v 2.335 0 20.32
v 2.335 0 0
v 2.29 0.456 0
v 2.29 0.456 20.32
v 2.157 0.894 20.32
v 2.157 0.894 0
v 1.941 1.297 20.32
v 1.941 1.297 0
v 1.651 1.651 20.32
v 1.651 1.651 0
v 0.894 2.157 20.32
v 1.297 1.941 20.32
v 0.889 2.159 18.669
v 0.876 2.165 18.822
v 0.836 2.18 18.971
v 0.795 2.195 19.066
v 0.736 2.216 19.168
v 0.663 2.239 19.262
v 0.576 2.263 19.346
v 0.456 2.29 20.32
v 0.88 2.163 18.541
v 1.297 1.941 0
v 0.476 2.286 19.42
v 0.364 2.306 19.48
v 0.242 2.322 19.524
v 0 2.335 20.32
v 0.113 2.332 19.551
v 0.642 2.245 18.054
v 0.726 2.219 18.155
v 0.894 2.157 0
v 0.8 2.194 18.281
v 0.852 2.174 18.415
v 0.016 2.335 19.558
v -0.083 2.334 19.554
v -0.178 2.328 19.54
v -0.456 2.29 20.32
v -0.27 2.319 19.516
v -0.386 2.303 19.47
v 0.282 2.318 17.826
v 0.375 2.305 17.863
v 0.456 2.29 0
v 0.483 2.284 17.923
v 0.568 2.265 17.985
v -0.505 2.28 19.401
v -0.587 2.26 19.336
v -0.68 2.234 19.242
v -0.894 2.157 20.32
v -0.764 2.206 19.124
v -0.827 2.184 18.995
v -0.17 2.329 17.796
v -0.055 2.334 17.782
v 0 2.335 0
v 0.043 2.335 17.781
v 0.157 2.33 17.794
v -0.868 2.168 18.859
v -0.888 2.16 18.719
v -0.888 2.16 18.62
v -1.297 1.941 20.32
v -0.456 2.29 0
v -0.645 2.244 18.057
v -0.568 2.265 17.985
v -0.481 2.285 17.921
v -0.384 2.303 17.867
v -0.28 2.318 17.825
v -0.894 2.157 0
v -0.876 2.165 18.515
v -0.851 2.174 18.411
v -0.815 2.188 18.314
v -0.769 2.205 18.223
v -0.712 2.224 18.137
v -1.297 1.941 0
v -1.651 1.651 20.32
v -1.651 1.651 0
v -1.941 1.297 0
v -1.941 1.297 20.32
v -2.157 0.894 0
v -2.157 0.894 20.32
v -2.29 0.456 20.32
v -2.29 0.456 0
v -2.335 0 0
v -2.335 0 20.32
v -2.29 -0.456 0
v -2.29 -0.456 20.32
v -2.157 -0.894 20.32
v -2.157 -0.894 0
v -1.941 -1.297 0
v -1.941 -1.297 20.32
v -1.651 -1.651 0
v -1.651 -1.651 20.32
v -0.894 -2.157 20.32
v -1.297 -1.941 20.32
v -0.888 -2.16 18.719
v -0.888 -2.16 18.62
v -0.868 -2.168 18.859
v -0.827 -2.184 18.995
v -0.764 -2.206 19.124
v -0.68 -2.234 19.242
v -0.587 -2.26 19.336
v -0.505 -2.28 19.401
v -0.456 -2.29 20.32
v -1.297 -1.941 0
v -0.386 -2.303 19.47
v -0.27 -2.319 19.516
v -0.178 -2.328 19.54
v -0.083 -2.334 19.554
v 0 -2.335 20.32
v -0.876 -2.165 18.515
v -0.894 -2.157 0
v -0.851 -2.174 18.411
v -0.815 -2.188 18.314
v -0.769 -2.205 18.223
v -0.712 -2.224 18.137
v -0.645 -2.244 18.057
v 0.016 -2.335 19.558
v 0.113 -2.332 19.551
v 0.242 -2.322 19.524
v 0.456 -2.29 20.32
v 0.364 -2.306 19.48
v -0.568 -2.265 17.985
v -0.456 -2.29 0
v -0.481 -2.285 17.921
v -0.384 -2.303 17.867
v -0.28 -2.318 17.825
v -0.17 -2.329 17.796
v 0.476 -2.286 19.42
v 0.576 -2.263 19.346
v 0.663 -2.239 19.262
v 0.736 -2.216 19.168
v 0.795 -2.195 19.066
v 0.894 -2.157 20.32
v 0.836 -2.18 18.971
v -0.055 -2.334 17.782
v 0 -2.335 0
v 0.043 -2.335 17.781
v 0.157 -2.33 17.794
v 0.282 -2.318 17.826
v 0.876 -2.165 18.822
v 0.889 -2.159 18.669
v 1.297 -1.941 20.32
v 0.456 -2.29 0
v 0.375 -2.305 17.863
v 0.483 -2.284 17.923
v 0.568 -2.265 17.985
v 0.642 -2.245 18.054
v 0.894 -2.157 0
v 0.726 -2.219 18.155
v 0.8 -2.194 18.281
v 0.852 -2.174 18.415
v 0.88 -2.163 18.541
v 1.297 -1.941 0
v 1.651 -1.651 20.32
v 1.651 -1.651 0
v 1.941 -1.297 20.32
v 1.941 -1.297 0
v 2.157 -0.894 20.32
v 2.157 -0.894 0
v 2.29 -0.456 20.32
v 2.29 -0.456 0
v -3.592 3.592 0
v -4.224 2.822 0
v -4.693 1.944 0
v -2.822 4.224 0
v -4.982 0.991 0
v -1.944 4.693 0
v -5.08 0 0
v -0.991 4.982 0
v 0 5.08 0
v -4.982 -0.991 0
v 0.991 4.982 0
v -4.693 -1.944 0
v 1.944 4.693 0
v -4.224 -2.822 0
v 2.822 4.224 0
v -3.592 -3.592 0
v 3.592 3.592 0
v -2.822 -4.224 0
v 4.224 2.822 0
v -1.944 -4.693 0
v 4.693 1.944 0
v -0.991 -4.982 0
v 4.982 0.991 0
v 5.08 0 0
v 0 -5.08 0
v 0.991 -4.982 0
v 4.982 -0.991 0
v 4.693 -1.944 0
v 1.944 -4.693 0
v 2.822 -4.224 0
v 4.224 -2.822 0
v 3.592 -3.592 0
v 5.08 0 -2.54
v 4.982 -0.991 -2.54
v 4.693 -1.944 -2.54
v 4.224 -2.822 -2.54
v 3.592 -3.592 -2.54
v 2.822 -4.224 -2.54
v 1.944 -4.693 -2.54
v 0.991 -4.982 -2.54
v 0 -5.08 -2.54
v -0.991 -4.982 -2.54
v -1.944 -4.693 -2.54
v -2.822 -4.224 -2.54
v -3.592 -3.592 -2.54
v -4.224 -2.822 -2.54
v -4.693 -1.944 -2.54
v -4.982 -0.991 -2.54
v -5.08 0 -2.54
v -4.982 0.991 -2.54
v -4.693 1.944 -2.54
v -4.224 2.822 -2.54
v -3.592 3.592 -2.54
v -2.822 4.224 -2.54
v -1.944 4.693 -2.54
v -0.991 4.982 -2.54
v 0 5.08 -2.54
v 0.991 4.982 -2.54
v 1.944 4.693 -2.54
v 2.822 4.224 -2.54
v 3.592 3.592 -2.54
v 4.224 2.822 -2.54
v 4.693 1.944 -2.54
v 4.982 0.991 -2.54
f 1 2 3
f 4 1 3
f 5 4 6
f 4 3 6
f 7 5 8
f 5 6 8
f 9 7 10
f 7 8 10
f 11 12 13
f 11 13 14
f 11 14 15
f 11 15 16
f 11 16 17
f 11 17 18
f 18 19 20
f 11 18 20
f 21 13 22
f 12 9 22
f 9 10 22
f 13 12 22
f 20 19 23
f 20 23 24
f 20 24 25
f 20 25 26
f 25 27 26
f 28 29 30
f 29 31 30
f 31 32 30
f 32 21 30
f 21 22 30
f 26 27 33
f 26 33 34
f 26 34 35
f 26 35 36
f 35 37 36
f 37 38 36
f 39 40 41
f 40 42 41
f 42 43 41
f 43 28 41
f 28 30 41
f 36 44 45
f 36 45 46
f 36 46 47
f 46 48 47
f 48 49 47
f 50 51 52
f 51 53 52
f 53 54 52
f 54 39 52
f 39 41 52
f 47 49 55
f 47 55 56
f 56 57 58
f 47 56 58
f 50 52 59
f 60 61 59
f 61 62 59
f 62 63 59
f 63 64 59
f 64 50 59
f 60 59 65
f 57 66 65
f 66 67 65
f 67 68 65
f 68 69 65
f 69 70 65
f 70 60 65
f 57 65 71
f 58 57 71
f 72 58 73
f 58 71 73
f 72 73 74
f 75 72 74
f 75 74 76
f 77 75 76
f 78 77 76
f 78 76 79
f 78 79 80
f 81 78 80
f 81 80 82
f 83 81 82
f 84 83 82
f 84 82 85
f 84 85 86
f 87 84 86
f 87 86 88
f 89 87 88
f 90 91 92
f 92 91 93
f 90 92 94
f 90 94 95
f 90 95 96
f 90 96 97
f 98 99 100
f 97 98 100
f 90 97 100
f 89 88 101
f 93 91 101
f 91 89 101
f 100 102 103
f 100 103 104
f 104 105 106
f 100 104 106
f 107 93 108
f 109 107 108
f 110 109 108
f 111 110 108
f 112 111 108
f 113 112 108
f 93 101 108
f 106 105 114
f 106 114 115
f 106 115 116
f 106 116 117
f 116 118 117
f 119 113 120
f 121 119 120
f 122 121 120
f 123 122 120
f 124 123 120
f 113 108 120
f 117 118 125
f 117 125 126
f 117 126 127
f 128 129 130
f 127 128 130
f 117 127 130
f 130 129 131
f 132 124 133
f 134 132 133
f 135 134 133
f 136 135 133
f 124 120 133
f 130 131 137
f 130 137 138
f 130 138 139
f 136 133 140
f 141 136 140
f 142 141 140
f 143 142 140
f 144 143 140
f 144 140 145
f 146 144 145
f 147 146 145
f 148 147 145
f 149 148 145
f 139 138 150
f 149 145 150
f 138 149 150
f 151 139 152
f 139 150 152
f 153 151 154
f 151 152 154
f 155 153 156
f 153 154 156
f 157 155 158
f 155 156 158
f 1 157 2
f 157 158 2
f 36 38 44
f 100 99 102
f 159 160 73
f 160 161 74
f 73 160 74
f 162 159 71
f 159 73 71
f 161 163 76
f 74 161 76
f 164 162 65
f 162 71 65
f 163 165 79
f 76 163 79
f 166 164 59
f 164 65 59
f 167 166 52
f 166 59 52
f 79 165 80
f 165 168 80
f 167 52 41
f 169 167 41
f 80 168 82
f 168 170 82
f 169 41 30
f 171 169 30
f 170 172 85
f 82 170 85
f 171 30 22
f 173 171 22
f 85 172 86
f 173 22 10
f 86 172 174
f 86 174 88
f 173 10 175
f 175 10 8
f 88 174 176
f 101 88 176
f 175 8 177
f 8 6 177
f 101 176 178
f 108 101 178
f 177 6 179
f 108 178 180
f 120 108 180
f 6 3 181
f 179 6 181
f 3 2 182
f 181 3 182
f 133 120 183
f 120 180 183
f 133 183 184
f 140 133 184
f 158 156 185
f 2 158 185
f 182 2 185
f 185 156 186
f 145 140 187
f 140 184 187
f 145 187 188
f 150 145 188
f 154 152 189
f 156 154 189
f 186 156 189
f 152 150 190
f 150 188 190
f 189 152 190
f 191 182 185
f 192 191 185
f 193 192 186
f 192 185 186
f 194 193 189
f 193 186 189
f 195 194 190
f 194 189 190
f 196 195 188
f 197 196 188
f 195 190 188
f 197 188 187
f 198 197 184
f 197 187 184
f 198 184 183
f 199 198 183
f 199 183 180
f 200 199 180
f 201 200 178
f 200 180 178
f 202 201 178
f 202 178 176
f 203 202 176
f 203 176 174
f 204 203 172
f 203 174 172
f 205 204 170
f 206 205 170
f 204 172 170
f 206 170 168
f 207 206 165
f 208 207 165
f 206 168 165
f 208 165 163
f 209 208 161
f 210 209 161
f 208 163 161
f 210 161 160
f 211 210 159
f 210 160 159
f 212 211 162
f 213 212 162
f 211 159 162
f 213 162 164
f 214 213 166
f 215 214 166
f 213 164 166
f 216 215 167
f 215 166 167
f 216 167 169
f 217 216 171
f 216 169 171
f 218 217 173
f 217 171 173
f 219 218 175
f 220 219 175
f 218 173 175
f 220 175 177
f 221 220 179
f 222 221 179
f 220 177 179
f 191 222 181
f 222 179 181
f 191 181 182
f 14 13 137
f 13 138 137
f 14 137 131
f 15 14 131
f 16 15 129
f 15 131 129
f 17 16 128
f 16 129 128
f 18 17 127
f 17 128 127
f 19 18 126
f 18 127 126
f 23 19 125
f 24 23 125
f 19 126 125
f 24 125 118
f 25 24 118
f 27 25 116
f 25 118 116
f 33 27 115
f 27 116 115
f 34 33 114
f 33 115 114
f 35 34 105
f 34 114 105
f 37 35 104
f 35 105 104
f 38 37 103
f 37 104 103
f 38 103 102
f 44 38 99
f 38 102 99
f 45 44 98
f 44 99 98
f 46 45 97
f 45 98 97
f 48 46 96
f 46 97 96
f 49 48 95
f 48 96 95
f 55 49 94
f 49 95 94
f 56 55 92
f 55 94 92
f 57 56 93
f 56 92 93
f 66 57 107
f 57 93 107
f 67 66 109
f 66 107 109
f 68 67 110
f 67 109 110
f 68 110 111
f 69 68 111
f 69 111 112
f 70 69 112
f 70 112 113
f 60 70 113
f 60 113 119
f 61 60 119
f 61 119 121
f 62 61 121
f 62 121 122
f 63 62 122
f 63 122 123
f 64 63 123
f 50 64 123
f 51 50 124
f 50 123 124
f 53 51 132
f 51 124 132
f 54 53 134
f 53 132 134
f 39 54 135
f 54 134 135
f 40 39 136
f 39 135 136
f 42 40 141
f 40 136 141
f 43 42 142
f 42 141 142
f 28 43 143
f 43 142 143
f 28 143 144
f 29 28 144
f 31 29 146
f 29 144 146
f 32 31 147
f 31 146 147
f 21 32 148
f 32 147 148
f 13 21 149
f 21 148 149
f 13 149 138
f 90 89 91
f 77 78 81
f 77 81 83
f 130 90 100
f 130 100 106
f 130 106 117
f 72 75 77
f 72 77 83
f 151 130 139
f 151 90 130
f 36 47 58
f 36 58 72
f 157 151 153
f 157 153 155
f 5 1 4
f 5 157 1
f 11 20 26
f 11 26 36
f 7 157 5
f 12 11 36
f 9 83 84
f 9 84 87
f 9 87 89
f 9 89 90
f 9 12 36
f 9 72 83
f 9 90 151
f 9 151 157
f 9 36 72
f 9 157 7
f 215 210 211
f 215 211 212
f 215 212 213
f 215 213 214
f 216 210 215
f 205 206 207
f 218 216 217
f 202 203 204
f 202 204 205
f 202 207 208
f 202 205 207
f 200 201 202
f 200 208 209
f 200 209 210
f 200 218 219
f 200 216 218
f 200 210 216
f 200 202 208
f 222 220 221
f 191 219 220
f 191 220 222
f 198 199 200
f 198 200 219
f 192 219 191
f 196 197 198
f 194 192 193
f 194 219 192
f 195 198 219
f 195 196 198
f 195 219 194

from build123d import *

# Parameters (mm, degrees)
F0_R     = 2.335
F1_DEPTH = 20.32
F2_R     = 5.08
F2_R_2   = 2.335
F3_DEPTH = 2.54
F4_R     = 0.889
F5_DEPTH = 12.7


with BuildPart() as f1:
    # F0 (on Top) → F1 (new body)
    with BuildSketch(Plane.XY):
        Circle(F0_R)
    extrude(amount=F1_DEPTH)

    # F2 (on face) → F3 (join)
    with BuildSketch(Plane(origin=(0, 0, 0), x_dir=(1, 0, 0), z_dir=(0, 0, -1))):
        Circle(F2_R)
        Circle(F2_R_2, mode=Mode.SUBTRACT)
        Circle(F2_R_2)
    extrude(amount=F3_DEPTH)

    # F4 (on Front) → F5 (cut, symmetric)
    with BuildSketch(Plane.XZ):
        with Locations((0, 18.669)):
            Circle(F4_R)
    extrude(amount=F5_DEPTH, both=True, mode=Mode.SUBTRACT)


solid = f1.part
